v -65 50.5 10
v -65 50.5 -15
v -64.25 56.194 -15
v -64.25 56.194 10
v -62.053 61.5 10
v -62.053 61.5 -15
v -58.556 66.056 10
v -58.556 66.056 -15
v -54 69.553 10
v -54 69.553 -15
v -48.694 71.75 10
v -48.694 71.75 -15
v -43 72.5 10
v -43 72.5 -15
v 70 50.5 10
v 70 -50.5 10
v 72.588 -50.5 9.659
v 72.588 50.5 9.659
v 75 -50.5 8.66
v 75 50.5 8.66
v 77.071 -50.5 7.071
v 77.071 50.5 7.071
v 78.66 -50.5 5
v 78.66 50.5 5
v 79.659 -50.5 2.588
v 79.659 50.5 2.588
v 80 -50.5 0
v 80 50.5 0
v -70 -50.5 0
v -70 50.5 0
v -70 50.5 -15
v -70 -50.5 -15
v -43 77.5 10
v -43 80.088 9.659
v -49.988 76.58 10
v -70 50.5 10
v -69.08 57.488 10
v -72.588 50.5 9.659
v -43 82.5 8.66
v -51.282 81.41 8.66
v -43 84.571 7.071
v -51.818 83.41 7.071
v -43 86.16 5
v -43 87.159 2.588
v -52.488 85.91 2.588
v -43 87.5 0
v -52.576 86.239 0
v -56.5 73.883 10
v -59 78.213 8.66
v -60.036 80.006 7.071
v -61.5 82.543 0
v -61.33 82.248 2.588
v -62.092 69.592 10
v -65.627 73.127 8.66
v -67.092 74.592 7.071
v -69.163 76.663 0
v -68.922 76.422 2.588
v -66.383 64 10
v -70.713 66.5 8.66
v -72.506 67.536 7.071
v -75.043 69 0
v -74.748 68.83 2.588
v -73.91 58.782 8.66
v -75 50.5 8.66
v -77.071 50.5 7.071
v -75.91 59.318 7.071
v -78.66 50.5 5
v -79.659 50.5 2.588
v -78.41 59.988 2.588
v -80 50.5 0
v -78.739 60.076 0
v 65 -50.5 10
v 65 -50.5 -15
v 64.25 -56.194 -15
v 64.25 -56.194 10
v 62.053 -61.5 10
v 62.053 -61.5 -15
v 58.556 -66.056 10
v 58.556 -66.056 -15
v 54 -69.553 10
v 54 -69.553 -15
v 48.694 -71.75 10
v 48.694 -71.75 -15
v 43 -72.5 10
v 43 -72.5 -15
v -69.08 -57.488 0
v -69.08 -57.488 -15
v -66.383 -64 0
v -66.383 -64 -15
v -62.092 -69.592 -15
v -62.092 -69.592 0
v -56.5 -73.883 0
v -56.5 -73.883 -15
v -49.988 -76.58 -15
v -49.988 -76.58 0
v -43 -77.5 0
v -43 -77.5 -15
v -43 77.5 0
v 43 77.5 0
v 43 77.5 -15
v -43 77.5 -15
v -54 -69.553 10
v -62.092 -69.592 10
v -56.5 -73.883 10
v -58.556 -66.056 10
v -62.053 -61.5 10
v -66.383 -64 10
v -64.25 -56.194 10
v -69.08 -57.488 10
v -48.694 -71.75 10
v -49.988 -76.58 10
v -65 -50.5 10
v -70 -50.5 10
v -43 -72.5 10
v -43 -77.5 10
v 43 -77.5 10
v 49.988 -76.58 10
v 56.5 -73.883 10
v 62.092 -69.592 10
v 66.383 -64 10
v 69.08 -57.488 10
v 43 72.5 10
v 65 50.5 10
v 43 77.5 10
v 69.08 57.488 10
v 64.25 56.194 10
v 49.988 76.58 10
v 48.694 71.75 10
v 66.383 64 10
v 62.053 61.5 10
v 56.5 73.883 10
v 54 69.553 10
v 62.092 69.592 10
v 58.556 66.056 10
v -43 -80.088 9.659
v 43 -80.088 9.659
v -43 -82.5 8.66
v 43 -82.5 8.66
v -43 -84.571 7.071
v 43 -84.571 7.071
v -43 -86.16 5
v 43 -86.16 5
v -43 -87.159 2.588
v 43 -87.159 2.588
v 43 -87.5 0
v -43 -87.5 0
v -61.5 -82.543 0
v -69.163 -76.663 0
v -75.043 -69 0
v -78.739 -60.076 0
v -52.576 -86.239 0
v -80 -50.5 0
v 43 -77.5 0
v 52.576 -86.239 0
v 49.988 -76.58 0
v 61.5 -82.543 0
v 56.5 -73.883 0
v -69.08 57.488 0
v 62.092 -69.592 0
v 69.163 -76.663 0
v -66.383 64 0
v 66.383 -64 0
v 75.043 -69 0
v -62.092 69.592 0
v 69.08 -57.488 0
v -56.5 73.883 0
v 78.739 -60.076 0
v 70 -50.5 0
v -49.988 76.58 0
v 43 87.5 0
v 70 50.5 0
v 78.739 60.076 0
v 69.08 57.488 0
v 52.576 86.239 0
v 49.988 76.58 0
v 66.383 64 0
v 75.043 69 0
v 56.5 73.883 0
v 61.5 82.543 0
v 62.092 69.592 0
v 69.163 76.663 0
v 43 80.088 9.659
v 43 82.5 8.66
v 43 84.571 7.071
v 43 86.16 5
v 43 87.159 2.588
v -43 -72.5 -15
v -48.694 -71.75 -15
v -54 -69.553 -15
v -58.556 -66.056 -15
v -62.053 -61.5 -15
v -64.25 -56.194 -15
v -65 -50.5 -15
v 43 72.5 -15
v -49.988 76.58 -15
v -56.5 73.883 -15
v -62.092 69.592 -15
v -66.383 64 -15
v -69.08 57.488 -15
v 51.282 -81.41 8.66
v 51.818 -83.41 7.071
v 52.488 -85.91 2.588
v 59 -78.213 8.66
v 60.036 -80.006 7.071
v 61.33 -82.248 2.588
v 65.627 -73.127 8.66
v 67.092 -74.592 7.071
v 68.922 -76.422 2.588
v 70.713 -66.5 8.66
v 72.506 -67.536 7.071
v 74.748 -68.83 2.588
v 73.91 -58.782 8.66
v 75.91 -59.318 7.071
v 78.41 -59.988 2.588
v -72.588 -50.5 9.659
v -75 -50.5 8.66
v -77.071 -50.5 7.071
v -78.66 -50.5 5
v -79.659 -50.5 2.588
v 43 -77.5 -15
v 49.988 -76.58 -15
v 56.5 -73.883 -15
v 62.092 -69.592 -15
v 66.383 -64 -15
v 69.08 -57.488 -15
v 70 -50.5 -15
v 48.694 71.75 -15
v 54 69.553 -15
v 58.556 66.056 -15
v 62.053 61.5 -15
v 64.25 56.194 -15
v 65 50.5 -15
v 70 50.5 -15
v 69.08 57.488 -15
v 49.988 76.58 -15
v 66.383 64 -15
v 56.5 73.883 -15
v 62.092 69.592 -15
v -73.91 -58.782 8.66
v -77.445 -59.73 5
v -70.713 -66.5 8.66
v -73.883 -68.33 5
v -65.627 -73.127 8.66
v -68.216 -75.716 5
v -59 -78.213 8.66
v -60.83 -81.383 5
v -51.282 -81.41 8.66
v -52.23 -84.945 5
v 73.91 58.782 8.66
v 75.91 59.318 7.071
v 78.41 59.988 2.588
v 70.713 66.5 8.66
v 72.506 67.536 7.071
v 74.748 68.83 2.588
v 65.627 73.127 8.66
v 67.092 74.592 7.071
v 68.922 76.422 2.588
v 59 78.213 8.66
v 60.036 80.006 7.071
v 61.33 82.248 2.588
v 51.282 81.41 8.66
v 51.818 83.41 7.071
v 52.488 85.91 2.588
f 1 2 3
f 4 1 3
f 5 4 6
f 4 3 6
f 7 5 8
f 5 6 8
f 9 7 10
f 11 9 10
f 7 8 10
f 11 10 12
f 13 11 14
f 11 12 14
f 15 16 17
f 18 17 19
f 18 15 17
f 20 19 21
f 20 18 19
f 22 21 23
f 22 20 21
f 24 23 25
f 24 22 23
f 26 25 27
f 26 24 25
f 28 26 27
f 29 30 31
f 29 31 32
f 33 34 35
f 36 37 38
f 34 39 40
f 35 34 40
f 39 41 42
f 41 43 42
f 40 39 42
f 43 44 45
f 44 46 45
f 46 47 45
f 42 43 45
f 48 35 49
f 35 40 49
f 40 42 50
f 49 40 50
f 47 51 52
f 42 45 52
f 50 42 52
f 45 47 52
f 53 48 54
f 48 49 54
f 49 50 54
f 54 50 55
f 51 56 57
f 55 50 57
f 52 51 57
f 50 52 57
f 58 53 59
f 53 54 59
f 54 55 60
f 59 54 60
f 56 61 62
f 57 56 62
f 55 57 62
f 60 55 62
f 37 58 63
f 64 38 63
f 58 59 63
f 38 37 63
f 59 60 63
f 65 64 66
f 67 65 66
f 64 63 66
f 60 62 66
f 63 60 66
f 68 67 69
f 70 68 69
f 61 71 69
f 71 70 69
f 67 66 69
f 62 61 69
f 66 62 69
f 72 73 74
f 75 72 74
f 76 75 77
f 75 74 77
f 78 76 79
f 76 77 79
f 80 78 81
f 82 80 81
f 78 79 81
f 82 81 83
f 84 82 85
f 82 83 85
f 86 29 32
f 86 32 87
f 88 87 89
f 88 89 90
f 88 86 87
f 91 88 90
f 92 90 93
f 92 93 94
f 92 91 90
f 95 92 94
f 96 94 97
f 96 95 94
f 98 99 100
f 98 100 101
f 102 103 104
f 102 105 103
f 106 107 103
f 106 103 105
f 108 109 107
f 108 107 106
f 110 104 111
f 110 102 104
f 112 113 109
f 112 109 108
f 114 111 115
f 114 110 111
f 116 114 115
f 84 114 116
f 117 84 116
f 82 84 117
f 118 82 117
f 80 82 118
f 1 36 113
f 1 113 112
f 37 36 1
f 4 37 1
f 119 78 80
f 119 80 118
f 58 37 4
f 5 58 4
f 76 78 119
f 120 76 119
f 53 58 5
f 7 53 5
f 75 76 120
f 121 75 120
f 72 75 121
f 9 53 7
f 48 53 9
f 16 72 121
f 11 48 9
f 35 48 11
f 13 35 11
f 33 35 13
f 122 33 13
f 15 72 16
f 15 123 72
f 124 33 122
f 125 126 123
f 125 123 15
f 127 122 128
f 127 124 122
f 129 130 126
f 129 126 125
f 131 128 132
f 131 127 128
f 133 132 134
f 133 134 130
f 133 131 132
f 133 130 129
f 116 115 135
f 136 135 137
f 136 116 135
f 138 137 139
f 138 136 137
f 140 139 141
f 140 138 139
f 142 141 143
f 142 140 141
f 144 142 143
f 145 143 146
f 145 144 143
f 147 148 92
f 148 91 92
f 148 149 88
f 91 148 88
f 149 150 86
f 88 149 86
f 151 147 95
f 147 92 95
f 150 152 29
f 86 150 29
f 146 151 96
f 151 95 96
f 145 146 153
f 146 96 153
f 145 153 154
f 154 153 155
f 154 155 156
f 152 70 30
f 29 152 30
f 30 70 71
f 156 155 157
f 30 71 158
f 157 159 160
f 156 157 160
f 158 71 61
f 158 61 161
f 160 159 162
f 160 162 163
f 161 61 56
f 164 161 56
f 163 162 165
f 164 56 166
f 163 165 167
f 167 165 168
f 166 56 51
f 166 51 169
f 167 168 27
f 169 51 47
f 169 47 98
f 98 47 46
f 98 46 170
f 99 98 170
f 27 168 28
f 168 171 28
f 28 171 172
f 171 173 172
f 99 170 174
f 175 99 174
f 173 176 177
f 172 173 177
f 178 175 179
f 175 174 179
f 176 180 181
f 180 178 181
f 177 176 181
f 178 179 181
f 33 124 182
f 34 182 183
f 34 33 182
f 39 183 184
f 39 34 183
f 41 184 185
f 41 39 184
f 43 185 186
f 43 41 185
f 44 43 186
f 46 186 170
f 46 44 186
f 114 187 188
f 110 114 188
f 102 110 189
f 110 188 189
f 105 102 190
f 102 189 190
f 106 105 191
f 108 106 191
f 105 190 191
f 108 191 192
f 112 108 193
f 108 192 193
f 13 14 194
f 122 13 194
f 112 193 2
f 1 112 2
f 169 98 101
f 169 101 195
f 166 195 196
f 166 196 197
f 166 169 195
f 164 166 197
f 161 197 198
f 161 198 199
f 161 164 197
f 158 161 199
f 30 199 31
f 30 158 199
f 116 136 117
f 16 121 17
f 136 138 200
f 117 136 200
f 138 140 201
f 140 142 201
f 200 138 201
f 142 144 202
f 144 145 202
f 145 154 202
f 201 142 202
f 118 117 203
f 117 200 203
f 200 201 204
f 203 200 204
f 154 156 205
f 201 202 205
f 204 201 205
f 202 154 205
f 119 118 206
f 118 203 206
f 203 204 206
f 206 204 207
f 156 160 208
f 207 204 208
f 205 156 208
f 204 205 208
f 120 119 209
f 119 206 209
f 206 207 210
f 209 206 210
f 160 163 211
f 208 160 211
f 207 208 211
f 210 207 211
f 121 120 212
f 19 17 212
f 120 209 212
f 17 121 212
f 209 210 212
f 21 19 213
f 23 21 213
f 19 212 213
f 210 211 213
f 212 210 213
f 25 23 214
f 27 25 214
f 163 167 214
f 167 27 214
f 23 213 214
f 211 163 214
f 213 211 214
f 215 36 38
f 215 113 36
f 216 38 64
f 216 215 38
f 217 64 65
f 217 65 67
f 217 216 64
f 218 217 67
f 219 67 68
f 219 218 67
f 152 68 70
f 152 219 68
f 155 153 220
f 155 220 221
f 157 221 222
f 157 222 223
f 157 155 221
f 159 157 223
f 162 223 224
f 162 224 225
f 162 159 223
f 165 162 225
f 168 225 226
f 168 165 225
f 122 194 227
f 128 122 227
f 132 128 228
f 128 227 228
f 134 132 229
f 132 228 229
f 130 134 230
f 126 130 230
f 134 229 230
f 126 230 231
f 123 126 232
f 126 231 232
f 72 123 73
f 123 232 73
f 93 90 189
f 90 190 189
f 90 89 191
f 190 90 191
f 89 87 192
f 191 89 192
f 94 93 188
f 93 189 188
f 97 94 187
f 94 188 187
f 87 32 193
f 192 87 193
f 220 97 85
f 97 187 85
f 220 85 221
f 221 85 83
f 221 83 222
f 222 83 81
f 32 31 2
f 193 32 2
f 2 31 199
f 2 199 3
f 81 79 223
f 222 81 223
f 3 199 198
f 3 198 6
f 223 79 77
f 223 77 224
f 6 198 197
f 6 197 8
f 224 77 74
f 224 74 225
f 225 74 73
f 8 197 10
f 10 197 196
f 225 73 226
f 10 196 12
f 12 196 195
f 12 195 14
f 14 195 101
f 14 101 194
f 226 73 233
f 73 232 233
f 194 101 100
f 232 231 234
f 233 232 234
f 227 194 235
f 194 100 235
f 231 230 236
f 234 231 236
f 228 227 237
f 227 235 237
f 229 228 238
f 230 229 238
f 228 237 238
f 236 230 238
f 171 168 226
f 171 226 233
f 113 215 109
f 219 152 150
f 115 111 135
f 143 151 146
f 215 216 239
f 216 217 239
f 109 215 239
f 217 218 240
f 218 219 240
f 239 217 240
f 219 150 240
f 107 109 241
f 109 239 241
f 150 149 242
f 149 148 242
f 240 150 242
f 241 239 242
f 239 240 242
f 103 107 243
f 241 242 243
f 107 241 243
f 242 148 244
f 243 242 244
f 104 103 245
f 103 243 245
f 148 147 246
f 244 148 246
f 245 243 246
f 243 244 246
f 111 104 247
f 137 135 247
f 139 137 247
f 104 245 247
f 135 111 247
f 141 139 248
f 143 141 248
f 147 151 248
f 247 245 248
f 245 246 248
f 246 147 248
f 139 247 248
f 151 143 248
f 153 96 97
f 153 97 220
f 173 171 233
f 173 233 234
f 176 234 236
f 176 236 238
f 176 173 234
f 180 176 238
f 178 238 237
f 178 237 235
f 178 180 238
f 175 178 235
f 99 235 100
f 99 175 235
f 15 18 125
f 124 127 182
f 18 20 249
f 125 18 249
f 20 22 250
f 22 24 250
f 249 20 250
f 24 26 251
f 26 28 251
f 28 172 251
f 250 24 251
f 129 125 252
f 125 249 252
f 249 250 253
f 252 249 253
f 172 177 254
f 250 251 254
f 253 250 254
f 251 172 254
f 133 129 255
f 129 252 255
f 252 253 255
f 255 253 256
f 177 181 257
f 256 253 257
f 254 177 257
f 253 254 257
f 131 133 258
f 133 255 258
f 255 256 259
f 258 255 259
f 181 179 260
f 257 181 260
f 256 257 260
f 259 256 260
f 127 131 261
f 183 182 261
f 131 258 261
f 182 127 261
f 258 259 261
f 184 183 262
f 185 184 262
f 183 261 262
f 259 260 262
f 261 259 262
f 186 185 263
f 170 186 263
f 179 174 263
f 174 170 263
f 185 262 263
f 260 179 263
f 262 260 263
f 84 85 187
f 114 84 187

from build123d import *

# Parameters (mm, degrees)
F1_DEPTH = 15
F2_DEPTH = 10
F3_R     = 9.99999


# Not quite as in the source:
# - a fillet or chamfer is up to 0.001 mm smaller than in the source, because OpenCascade refuses the exact size
# - a feature of the source that left no trace in its solid (it failed there, or was rolled back) is left out


with BuildPart() as f1:
    # F0 (on Top) → F1 (new body)
    with BuildSketch(Plane.XY):
        with BuildLine():
            Line((-43, -77.5), (43, -77.5))
            ThreePointArc((43, -77.5), (62.091883092, -69.591883092), (70, -50.5))
            Line((70, -50.5), (70, 50.5))
            ThreePointArc((70, 50.5), (62.091883092, 69.591883092), (43, 77.5))
            Line((43, 77.5), (-43, 77.5))
            ThreePointArc((-43, 77.5), (-62.091883092, 69.591883092), (-70, 50.5))
            Line((-70, 50.5), (-70, -50.5))
            ThreePointArc((-70, -50.5), (-62.091883092, -69.591883092), (-43, -77.5))
        make_face()
        with BuildLine():
            Line((64.9999988648, 50.5), (64.9999988648, -50.5))
            ThreePointArc((64.9999988648, -50.5), (58.5563483834, -66.0563483834), (43, -72.4999988648))
            Line((43, -72.4999988648), (-43, -72.4999988648))
            ThreePointArc((-43, -72.4999988648), (-58.5563483834, -66.0563483834), (-64.9999988648, -50.5))
            Line((-64.9999988648, -50.5), (-64.9999988648, 50.5))
            ThreePointArc((-64.9999988648, 50.5), (-58.5563483834, 66.0563483834), (-43, 72.4999988648))
            Line((-43, 72.4999988648), (43, 72.4999988648))
            ThreePointArc((43, 72.4999988648), (58.5563483834, 66.0563483834), (64.9999988648, 50.5))
        make_face(mode=Mode.SUBTRACT)
    extrude(amount=-F1_DEPTH)

    # F0 (on Top) → F2 (join)
    with BuildSketch(Plane.XY):
        with BuildLine():
            Line((80, -50.5), (80, 50.5))
            ThreePointArc((80, 50.5), (69.1629509039, 76.6629509039), (43, 87.5))
            Line((43, 87.5), (-43, 87.5))
            ThreePointArc((-43, 87.5), (-69.1629509039, 76.6629509039), (-80, 50.5))
            Line((-80, 50.5), (-80, -50.5))
            ThreePointArc((-80, -50.5), (-69.1629509039, -76.6629509039), (-43, -87.5))
            Line((-43, -87.5), (43, -87.5))
            ThreePointArc((43, -87.5), (69.1629509039, -76.6629509039), (80, -50.5))
        make_face()
        with BuildLine():
            ThreePointArc((70, -50.5), (62.091883092, -69.591883092), (43, -77.5))
            Line((43, -77.5), (-43, -77.5))
            ThreePointArc((-43, -77.5), (-62.091883092, -69.591883092), (-70, -50.5))
            Line((-70, -50.5), (-70, 50.5))
            ThreePointArc((-70, 50.5), (-62.091883092, 69.591883092), (-43, 77.5))
            Line((-43, 77.5), (43, 77.5))
            ThreePointArc((43, 77.5), (62.091883092, 69.591883092), (70, 50.5))
            Line((70, 50.5), (70, -50.5))
        make_face(mode=Mode.SUBTRACT)
        with BuildLine():
            Line((-43, -77.5), (43, -77.5))
            ThreePointArc((43, -77.5), (62.091883092, -69.591883092), (70, -50.5))
            Line((70, -50.5), (70, 50.5))
            ThreePointArc((70, 50.5), (62.091883092, 69.591883092), (43, 77.5))
            Line((43, 77.5), (-43, 77.5))
            ThreePointArc((-43, 77.5), (-62.091883092, 69.591883092), (-70, 50.5))
            Line((-70, 50.5), (-70, -50.5))
            ThreePointArc((-70, -50.5), (-62.091883092, -69.591883092), (-43, -77.5))
        make_face()
        with BuildLine():
            Line((64.9999988648, 50.5), (64.9999988648, -50.5))
            ThreePointArc((64.9999988648, -50.5), (58.5563483834, -66.0563483834), (43, -72.4999988648))
            Line((43, -72.4999988648), (-43, -72.4999988648))
            ThreePointArc((-43, -72.4999988648), (-58.5563483834, -66.0563483834), (-64.9999988648, -50.5))
            Line((-64.9999988648, -50.5), (-64.9999988648, 50.5))
            ThreePointArc((-64.9999988648, 50.5), (-58.5563483834, 66.0563483834), (-43, 72.4999988648))
            Line((-43, 72.4999988648), (43, 72.4999988648))
            ThreePointArc((43, 72.4999988648), (58.5563483834, 66.0563483834), (64.9999988648, 50.5))
        make_face(mode=Mode.SUBTRACT)
    extrude(amount=F2_DEPTH)

    # F3 (radius 10 in the source; OpenCascade refuses exactly that, so slightly less here)
    f3_edges = [f1.edges().sort_by_distance(p)[0] for p in [
        (-69.162951, -76.662951, 10),
        (80, 0, 10),
        (69.162951, 76.662951, 10),
        (0, 87.5, 10),
        (-69.162951, 76.662951, 10),
        (-80, 0, 10),
        (0, -87.5, 10),
        (69.162951, -76.662951, 10),
    ]]
    fillet(f3_edges, radius=F3_R)


solid = f1.part
